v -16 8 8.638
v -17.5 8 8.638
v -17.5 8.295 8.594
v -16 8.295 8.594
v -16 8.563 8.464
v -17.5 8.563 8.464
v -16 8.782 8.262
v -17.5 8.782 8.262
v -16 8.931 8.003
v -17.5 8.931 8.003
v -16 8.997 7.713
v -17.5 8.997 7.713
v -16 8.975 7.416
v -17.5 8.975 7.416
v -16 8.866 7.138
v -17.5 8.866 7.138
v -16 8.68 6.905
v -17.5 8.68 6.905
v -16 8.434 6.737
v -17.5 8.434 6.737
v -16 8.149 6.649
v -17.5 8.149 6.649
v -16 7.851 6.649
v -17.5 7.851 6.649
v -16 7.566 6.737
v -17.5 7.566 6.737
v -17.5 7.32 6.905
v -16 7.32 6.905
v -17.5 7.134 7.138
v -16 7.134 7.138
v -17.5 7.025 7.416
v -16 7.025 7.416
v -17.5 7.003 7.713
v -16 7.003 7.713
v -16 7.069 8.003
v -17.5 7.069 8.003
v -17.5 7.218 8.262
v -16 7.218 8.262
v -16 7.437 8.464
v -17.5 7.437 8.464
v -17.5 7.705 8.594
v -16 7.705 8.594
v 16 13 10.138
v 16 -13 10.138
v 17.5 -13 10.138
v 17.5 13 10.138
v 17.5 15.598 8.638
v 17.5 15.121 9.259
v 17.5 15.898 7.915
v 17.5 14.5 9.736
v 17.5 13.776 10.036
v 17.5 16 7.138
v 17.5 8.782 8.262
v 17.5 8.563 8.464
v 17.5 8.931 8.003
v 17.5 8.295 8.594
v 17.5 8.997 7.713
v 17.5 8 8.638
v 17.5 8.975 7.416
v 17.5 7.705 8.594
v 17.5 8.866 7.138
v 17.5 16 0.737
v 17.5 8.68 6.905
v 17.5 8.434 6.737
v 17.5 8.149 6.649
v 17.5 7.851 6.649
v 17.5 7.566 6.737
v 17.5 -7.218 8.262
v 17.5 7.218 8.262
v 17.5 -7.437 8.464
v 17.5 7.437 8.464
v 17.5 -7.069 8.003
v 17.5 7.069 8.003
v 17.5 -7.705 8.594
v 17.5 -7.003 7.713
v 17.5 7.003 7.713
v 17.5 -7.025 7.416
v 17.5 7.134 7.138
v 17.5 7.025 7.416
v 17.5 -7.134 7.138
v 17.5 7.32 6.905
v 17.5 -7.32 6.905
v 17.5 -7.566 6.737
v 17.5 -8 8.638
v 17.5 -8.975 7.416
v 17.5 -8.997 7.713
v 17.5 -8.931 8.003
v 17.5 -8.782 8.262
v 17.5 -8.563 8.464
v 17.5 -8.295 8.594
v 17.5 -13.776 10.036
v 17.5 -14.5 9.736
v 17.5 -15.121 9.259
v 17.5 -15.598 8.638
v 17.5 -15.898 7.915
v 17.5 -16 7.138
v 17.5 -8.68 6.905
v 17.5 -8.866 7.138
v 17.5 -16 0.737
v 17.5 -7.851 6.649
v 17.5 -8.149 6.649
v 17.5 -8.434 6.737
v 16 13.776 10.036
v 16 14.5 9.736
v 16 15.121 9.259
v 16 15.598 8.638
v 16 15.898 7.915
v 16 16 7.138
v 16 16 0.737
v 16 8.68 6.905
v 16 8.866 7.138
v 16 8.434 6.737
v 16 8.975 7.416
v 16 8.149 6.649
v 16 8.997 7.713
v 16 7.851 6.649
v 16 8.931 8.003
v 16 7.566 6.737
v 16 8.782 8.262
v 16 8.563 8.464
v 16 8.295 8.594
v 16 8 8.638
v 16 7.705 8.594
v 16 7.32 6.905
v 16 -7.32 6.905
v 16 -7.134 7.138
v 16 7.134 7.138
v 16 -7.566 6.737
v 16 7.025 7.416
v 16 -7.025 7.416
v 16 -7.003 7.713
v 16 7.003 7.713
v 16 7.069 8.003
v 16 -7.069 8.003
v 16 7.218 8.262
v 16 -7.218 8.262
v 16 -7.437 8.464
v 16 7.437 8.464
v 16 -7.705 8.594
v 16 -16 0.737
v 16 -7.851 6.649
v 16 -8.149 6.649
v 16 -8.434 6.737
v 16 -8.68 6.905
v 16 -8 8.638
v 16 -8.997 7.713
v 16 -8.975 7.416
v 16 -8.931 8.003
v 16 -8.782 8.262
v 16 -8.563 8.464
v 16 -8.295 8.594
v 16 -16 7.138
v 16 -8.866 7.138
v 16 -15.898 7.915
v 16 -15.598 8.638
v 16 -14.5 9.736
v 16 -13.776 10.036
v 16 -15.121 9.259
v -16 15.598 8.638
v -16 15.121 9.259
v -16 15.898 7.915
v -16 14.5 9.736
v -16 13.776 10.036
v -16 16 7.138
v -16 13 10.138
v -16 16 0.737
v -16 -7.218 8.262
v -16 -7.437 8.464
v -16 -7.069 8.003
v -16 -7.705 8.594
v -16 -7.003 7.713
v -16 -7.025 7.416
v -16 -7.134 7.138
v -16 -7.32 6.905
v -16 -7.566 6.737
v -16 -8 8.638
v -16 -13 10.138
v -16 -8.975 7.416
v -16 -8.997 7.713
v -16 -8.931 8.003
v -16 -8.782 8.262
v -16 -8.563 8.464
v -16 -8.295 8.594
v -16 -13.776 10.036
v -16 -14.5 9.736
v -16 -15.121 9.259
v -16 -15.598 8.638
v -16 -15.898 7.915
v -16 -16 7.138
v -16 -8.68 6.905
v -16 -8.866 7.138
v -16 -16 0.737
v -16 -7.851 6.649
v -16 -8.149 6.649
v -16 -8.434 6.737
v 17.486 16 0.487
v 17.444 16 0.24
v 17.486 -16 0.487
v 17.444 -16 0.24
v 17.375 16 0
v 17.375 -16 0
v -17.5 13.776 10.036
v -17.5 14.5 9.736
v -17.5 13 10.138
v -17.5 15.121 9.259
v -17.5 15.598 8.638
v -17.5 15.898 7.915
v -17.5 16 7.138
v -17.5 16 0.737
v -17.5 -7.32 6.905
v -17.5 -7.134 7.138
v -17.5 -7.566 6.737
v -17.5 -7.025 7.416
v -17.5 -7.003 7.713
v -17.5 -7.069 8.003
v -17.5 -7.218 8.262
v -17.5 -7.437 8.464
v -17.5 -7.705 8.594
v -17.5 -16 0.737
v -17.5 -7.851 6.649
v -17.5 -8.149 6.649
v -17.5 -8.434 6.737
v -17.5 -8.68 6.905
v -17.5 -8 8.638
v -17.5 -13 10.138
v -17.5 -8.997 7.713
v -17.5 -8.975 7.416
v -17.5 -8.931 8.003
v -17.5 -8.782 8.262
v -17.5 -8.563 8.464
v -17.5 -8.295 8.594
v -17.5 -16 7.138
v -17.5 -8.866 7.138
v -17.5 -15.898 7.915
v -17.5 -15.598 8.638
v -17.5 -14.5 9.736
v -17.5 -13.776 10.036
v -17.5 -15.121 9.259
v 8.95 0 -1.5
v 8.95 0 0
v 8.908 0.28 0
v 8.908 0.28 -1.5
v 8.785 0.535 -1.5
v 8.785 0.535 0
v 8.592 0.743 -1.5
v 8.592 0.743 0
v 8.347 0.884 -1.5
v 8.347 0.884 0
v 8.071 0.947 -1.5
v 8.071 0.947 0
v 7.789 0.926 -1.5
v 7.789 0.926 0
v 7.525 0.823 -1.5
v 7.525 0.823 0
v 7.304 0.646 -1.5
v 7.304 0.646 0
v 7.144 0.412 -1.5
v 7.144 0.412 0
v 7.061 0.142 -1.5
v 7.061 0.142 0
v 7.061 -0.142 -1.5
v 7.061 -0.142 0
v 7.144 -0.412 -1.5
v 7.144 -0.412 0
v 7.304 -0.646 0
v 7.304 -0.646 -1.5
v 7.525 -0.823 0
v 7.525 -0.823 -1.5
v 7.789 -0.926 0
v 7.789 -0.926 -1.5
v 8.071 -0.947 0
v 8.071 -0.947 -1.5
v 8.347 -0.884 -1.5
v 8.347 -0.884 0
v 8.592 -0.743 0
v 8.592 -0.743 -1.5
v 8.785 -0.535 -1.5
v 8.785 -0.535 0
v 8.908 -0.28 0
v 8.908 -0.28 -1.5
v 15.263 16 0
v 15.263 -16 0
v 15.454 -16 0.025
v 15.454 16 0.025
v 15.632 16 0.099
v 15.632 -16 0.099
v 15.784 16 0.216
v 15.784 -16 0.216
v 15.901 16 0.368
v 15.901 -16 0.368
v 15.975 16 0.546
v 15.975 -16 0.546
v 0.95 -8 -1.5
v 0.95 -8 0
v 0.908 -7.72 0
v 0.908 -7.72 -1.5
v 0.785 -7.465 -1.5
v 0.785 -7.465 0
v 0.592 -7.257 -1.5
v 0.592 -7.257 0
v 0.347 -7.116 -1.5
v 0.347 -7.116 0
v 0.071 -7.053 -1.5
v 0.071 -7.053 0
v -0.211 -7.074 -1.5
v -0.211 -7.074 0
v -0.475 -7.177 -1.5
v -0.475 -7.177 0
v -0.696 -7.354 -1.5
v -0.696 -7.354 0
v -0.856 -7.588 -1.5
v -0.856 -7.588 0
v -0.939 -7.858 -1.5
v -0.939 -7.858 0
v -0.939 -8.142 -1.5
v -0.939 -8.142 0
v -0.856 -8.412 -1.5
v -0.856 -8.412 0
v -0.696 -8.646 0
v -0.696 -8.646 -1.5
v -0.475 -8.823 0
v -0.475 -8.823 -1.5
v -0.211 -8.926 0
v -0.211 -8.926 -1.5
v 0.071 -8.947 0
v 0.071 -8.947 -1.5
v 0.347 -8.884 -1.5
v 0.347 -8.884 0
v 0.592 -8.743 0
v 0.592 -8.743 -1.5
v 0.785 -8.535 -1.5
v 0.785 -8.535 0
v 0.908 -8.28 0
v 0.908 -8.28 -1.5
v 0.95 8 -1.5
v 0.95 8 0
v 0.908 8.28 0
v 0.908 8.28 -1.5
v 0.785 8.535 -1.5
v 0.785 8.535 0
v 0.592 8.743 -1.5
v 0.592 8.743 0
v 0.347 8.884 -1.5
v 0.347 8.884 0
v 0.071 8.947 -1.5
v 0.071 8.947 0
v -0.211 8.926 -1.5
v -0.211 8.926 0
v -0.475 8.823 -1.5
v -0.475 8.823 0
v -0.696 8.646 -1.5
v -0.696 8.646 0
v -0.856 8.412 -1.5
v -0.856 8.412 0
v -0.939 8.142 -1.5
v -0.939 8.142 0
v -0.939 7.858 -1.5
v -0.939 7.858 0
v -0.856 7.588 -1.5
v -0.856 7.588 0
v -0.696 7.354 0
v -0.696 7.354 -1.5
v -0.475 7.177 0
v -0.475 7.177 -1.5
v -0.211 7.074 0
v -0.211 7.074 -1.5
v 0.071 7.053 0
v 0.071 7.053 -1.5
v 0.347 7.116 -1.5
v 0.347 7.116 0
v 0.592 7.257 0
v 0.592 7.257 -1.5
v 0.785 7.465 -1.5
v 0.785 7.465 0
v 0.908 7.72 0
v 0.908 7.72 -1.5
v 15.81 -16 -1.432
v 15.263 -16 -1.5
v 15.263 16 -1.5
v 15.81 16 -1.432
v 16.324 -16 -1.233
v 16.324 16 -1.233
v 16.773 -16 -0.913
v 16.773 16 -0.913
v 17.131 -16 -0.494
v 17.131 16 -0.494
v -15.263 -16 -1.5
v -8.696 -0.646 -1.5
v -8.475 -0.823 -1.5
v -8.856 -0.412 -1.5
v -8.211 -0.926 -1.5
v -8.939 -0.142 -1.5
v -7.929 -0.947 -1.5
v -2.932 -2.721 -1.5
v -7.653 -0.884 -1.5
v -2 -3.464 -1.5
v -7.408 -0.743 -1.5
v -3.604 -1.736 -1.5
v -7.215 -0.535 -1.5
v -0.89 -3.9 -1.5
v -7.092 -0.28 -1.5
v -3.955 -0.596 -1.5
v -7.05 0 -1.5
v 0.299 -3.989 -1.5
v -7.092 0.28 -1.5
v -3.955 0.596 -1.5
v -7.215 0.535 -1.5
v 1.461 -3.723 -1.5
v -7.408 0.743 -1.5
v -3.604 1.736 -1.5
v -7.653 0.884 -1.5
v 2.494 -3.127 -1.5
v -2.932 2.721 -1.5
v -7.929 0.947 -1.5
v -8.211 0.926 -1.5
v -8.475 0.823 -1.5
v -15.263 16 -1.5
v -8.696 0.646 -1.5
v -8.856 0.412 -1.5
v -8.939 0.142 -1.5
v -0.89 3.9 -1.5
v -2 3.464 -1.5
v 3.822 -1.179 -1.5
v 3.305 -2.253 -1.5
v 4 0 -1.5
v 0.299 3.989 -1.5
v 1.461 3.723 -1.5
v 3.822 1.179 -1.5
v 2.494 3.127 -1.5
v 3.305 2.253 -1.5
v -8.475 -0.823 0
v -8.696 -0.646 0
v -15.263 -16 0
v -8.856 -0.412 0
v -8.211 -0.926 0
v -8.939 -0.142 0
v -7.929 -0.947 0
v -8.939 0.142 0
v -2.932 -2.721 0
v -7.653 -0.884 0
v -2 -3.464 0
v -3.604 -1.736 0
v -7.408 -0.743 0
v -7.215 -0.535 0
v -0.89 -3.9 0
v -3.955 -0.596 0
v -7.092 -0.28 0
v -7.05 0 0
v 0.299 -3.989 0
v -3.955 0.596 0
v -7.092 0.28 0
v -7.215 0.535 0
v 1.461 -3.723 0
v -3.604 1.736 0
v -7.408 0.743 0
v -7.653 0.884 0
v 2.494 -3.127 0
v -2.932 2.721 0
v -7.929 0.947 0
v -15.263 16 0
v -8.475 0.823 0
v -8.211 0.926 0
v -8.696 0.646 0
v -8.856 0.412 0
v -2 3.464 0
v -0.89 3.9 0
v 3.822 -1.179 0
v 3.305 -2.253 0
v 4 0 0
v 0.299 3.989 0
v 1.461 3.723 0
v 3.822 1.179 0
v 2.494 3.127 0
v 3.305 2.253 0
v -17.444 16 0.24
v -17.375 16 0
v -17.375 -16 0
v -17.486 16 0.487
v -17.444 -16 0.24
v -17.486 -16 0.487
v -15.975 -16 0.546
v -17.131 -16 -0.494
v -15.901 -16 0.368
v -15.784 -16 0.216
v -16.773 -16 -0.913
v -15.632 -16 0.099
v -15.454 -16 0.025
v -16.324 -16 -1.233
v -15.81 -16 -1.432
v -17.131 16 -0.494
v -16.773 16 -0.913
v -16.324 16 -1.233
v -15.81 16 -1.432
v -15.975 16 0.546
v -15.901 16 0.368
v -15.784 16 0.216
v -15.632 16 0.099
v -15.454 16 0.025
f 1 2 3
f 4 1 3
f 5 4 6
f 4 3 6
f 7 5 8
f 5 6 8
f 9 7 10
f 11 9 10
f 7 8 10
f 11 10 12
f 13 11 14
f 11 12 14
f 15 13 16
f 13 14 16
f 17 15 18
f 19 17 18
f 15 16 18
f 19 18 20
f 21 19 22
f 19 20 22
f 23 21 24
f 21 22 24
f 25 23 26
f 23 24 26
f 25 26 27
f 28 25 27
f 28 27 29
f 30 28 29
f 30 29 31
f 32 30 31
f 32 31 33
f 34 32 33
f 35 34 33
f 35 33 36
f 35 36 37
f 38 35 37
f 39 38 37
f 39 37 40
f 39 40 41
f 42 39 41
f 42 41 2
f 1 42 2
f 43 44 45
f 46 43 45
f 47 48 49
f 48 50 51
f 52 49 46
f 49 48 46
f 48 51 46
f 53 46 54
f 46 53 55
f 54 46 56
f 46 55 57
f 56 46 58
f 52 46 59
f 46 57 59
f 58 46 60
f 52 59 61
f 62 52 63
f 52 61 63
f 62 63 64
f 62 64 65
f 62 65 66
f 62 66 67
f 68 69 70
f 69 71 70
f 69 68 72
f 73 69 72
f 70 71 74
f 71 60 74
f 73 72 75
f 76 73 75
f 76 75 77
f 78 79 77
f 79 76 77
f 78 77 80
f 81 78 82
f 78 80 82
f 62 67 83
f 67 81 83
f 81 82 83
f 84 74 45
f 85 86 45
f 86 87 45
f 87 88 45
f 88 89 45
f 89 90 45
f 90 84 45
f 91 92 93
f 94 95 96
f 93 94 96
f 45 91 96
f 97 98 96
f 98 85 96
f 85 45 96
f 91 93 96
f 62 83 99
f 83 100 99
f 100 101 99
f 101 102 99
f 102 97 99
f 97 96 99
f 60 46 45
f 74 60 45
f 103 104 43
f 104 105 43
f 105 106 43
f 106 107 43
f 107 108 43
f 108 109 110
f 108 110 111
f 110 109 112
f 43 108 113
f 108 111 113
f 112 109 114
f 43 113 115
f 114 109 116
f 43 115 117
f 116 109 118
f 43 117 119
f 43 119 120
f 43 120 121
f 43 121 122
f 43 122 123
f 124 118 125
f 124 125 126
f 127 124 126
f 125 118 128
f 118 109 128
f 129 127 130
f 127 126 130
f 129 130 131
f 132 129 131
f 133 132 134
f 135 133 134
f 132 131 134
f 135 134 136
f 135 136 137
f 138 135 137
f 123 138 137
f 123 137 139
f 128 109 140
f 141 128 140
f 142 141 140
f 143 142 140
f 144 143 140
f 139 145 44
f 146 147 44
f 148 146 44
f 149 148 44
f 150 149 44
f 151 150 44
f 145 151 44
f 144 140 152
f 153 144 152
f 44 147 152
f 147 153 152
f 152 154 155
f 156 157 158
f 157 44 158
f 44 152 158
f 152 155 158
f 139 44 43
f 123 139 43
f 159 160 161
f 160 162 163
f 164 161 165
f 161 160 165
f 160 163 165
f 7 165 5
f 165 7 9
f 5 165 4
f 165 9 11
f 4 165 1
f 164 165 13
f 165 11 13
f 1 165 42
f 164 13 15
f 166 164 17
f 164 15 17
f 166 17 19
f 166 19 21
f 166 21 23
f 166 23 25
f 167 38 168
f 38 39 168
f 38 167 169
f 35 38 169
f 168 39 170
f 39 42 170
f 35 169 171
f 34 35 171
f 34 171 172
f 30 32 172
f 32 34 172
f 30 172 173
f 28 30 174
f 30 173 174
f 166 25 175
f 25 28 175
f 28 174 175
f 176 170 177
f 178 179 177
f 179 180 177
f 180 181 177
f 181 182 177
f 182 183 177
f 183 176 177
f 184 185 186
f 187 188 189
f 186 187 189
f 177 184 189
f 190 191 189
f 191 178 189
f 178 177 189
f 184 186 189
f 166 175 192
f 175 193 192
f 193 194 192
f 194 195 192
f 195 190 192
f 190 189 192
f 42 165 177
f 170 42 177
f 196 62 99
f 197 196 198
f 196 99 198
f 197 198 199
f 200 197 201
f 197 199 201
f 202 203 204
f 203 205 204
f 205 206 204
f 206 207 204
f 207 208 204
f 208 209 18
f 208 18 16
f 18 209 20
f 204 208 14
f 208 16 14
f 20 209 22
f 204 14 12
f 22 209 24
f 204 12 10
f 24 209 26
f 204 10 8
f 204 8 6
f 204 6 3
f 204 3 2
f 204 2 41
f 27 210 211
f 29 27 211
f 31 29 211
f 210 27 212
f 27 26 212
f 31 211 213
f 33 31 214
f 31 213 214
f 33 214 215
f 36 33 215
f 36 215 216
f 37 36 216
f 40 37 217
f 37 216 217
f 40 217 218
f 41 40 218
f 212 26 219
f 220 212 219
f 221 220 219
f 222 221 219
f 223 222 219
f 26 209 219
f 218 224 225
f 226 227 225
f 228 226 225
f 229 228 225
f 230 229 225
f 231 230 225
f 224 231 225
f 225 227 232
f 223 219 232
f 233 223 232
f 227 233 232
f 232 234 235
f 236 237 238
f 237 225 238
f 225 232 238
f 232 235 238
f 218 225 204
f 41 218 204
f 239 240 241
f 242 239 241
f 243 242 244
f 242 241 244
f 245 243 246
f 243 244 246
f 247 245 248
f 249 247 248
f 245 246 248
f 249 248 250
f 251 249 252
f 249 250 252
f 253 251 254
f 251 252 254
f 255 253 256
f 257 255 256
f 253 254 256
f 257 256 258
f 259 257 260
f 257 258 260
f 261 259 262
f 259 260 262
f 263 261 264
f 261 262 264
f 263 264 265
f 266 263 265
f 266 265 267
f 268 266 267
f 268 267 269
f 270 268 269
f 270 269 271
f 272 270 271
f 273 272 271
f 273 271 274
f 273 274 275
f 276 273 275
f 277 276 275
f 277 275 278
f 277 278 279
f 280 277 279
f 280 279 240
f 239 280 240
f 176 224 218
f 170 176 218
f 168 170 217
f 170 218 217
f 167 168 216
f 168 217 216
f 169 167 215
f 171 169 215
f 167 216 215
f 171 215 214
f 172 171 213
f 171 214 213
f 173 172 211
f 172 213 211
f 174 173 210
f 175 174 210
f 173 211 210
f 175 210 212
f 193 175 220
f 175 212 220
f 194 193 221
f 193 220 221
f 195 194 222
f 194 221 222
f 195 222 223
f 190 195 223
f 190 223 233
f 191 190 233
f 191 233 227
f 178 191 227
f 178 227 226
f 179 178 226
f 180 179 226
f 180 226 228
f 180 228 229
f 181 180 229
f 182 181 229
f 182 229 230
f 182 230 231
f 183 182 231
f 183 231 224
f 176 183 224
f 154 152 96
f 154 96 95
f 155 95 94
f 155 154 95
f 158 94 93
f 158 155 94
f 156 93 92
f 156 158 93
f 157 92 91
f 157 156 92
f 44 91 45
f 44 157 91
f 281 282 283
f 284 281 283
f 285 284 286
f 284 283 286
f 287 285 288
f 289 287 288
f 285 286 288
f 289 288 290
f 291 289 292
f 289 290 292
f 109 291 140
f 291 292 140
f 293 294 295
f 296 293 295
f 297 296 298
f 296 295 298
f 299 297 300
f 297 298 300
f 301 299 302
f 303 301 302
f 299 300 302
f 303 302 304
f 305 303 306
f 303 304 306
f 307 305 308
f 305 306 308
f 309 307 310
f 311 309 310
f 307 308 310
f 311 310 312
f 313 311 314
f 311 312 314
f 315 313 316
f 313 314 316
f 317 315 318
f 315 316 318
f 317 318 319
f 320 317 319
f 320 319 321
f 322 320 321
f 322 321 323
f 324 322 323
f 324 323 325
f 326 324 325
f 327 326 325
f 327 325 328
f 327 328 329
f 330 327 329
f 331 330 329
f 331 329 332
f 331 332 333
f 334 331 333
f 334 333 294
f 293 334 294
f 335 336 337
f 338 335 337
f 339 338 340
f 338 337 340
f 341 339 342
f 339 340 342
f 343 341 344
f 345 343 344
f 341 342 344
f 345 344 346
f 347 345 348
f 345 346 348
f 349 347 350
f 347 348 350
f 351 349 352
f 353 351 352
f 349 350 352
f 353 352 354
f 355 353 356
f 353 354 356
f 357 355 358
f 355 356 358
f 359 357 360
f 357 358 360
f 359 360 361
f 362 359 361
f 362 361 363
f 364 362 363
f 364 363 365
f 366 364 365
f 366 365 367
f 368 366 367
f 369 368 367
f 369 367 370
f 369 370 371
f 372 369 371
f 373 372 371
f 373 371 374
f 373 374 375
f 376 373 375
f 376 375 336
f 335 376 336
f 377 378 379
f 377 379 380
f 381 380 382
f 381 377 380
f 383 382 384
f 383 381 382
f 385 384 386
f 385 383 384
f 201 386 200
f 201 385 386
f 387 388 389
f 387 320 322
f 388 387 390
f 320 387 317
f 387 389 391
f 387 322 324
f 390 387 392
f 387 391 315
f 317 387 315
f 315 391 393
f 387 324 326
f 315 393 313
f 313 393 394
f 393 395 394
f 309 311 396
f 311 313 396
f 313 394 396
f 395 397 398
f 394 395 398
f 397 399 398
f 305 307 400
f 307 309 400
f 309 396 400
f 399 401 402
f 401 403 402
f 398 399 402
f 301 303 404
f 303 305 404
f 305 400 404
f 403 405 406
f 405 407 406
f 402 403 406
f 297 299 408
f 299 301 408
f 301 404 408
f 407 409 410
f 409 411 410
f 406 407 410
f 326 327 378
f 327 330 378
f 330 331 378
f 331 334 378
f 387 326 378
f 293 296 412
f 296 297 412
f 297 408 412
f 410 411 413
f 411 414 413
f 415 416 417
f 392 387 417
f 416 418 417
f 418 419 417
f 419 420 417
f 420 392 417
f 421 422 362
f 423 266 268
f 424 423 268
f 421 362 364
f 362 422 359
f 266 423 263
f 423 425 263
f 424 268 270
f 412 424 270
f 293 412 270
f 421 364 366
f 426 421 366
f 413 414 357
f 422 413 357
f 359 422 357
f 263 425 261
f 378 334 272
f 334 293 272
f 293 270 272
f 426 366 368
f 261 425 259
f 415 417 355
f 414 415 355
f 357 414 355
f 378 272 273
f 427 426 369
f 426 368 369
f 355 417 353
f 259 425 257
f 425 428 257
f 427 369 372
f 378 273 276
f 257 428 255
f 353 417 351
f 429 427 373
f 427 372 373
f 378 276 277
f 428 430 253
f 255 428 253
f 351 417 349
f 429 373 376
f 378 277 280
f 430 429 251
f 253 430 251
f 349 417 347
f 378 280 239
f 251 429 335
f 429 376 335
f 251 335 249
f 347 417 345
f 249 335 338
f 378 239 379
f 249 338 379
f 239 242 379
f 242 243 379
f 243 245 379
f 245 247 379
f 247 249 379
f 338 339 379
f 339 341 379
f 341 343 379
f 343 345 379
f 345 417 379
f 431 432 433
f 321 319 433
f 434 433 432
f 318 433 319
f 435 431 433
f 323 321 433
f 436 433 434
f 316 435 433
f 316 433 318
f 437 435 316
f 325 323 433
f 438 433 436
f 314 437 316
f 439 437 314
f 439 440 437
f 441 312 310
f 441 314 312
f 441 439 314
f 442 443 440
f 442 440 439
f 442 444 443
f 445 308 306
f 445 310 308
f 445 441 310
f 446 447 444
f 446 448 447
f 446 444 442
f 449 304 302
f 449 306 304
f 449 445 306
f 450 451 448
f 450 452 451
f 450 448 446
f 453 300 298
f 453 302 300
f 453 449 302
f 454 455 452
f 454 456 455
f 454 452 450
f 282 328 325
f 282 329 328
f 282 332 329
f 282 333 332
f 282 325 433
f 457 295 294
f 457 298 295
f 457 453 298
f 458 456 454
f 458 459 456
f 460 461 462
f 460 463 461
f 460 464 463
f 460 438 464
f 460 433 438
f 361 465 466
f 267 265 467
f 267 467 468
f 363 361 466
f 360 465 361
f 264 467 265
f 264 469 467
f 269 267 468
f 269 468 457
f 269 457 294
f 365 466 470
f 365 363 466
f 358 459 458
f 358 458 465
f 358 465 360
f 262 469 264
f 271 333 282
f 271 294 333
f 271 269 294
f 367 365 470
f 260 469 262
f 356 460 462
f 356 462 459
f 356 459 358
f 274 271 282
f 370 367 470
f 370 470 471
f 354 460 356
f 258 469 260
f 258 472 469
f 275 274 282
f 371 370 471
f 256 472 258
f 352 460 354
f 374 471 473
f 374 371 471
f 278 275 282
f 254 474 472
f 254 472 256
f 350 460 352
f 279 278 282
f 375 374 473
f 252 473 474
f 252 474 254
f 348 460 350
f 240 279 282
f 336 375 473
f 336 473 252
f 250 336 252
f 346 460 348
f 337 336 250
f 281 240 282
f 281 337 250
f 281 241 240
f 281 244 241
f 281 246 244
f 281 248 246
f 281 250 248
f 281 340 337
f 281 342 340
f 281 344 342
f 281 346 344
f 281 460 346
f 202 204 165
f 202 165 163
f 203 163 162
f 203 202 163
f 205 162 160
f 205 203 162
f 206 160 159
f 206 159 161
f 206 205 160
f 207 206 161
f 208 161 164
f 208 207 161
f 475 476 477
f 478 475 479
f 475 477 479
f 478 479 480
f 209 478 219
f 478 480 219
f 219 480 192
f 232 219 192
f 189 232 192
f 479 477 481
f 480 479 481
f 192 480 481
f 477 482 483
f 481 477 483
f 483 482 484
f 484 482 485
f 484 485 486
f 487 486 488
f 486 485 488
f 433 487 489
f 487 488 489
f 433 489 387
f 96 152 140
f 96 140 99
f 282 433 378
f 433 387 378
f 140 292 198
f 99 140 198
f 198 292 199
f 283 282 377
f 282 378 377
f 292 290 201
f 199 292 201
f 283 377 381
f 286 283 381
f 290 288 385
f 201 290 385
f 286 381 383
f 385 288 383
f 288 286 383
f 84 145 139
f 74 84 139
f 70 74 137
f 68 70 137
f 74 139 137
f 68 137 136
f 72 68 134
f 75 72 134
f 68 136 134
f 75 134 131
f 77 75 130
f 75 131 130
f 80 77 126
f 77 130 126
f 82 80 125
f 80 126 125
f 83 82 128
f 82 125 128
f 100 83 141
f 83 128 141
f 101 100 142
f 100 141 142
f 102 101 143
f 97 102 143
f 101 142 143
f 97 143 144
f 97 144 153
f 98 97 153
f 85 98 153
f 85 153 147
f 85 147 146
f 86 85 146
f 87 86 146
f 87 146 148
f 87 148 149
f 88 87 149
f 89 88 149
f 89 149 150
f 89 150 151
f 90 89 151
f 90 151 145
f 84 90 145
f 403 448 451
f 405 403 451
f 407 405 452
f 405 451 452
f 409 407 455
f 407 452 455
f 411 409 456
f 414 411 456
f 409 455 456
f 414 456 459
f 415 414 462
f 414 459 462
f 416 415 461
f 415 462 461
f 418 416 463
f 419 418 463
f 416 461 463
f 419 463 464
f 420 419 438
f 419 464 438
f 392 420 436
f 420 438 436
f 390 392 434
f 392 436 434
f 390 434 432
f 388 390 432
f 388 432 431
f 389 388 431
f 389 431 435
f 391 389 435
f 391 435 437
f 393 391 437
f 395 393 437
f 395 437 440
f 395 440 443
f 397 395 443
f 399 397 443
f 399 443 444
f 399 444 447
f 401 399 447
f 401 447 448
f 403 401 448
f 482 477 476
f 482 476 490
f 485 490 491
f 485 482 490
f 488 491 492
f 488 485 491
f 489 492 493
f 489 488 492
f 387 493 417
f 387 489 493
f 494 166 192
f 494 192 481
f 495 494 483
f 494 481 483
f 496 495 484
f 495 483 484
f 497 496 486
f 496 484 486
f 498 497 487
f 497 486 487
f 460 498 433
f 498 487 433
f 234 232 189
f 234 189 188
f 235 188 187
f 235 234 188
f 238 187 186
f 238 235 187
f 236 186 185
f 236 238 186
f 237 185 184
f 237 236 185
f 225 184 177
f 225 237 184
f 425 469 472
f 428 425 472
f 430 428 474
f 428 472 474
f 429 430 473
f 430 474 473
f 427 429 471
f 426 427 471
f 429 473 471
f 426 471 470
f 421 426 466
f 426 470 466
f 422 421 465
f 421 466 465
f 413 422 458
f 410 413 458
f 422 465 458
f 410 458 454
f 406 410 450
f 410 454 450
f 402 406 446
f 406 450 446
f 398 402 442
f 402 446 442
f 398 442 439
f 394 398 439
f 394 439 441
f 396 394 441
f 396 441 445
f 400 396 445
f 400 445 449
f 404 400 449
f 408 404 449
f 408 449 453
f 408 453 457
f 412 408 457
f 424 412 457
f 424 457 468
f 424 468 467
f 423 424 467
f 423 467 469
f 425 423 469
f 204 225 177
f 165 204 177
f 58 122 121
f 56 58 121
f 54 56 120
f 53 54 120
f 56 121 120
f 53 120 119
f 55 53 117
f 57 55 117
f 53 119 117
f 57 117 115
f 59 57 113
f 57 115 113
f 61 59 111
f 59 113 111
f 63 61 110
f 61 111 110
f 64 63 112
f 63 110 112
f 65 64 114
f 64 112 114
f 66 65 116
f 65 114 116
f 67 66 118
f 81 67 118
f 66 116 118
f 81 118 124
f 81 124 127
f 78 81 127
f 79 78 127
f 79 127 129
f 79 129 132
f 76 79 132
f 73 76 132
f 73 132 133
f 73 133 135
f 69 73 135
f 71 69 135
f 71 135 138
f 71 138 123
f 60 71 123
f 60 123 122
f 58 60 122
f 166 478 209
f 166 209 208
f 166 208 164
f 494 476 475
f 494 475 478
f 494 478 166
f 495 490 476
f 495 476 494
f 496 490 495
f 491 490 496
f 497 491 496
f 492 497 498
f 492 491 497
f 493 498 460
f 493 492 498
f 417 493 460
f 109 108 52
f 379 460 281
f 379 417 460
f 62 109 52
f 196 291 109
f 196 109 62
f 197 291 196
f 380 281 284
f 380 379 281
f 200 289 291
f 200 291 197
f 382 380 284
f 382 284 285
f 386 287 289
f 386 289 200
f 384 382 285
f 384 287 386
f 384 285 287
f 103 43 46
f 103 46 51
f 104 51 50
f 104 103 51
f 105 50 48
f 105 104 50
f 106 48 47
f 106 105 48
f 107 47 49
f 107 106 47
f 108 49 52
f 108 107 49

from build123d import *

# Parameters (mm, degrees)
SM_BASE_FLANGE_1_DEPTH = 1.5
OTHER_START            = -16
OTHER_1_DEPTH          = 32
OTHER_1_2_DEPTH        = 32
OTHER_START_2          = -18
OTHER_1_3_DEPTH        = 36
SKETCH_7_R             = 1
CUT_EXTRUDE_1_DEPTH    = 40.796735326
SKETCH_8_R             = 4
SKETCH_8_R_2           = 0.95
CUT_EXTRUDE_2_DEPTH    = 10


with BuildPart() as part:
    # 基体-法兰1: sheet metal written as solids
    # Sketch 1 → 基体-法兰1 (new body)
    with BuildSketch(Plane.XY):
        with BuildLine():
            Line((-24, -16), (24, -16))
            ThreePointArc((24, -16), (26.121320344, -15.121320344), (27, -13))
            Line((27, -13), (27, 13))
            ThreePointArc((27, 13), (26.121320344, 15.121320344), (24, 16))
            Line((24, 16), (-24, 16))
            ThreePointArc((-24, 16), (-26.121320344, 15.121320344), (-27, 13))
            Line((-27, 13), (-27, -13))
            ThreePointArc((-27, -13), (-26.121320344, -15.121320344), (-24, -16))
        make_face()
    extrude(amount=-SM_BASE_FLANGE_1_DEPTH)

    # Other 1: read off the stored shape, not the designer's step
    # Other 1 outline → Other 1 (cut)
    with BuildSketch(Plane(origin=(0, 0, 0), x_dir=(1, 0, 0), z_dir=(0, 1, 0)).offset(OTHER_START)):
        with BuildLine():
            ThreePointArc((-17.375223856, 0), (-16.558564082, 1.086838938), (-15.2634, 1.5))
            Line((-15.2634, 1.5), (-27, 1.5))
            Line((-27, 1.5), (-27, 0))
            Line((-27, 0), (-17.375223856, 0))
        make_face()
        with BuildLine():
            Line((27, 1.5), (15.2634, 1.5))
            ThreePointArc((15.2634, 1.5), (16.558564082, 1.086838938), (17.375223856, 0))
            Line((17.375223856, 0), (27, 0))
            Line((27, 0), (27, 1.5))
        make_face()
    extrude(amount=OTHER_1_DEPTH, mode=Mode.SUBTRACT)

    # Other 1 2 outline → Other 1 2 (add)
    with BuildSketch(Plane(origin=(0, 0, 0), x_dir=(1, 0, 0), z_dir=(0, 1, 0)).offset(OTHER_START)):
        with BuildLine():
            Line((-15.2634, 0), (-17.375223856, 0))
            ThreePointArc((-17.375223856, 0), (-17.468585343, -0.363053267), (-17.5, -0.7366))
            Line((-17.5, -0.7366), (-17.5, -10.138054181))
            Line((-17.5, -10.138054181), (-16, -10.138054181))
            Line((-16, -10.138054181), (-16, -0.7366))
            ThreePointArc((-16, -0.7366), (-15.784254855, -0.215745145), (-15.2634, 0))
        make_face()
        with BuildLine():
            ThreePointArc((17.5, -0.7366), (17.468585343, -0.363053267), (17.375223856, 0))
            Line((17.375223856, 0), (15.2634, 0))
            ThreePointArc((15.2634, 0), (15.784254855, -0.215745145), (16, -0.7366))
            Line((16, -0.7366), (16, -10.138054181))
            Line((16, -10.138054181), (17.5, -10.138054181))
            Line((17.5, -10.138054181), (17.5, -0.7366))
        make_face()
    extrude(amount=OTHER_1_2_DEPTH)

    # Other 1 3 outline → Other 1 3 (cut)
    with BuildSketch(Plane.YZ.offset(OTHER_START_2)):
        with BuildLine():
            ThreePointArc((-16, 7.138054181), (-15.121320344, 9.259374525), (-13, 10.138054181))
            Line((-13, 10.138054181), (-16, 10.138054181))
            Line((-16, 10.138054181), (-16, 7.138054181))
        make_face()
        with BuildLine():
            ThreePointArc((13, 10.138054181), (15.121320344, 9.259374525), (16, 7.138054181))
            Line((16, 7.138054181), (16, 10.138054181))
            Line((16, 10.138054181), (13, 10.138054181))
        make_face()
    extrude(amount=OTHER_1_3_DEPTH, mode=Mode.SUBTRACT)

    # 草图7 → 切除-拉伸1 (cut, through all)
    with BuildSketch(Plane.ZY.offset(17.5)):
        with Locations((7.638054181, 8)):
            Circle(SKETCH_7_R)
        with Locations((7.638054181, -8)):
            Circle(SKETCH_7_R)
    extrude(amount=-CUT_EXTRUDE_1_DEPTH, mode=Mode.SUBTRACT)

    # 草图8 → 切除-拉伸2 (cut)
    with BuildSketch(Plane.XY):
        Circle(SKETCH_8_R)
        with Locations((0, 8)):
            Circle(SKETCH_8_R_2)
        with Locations((8, 0)):
            Circle(SKETCH_8_R_2)
        with Locations((0, -8)):
            Circle(SKETCH_8_R_2)
        with Locations((-8, 0)):
            Circle(SKETCH_8_R_2)
    extrude(amount=-CUT_EXTRUDE_2_DEPTH, mode=Mode.SUBTRACT)


solid = part.part
